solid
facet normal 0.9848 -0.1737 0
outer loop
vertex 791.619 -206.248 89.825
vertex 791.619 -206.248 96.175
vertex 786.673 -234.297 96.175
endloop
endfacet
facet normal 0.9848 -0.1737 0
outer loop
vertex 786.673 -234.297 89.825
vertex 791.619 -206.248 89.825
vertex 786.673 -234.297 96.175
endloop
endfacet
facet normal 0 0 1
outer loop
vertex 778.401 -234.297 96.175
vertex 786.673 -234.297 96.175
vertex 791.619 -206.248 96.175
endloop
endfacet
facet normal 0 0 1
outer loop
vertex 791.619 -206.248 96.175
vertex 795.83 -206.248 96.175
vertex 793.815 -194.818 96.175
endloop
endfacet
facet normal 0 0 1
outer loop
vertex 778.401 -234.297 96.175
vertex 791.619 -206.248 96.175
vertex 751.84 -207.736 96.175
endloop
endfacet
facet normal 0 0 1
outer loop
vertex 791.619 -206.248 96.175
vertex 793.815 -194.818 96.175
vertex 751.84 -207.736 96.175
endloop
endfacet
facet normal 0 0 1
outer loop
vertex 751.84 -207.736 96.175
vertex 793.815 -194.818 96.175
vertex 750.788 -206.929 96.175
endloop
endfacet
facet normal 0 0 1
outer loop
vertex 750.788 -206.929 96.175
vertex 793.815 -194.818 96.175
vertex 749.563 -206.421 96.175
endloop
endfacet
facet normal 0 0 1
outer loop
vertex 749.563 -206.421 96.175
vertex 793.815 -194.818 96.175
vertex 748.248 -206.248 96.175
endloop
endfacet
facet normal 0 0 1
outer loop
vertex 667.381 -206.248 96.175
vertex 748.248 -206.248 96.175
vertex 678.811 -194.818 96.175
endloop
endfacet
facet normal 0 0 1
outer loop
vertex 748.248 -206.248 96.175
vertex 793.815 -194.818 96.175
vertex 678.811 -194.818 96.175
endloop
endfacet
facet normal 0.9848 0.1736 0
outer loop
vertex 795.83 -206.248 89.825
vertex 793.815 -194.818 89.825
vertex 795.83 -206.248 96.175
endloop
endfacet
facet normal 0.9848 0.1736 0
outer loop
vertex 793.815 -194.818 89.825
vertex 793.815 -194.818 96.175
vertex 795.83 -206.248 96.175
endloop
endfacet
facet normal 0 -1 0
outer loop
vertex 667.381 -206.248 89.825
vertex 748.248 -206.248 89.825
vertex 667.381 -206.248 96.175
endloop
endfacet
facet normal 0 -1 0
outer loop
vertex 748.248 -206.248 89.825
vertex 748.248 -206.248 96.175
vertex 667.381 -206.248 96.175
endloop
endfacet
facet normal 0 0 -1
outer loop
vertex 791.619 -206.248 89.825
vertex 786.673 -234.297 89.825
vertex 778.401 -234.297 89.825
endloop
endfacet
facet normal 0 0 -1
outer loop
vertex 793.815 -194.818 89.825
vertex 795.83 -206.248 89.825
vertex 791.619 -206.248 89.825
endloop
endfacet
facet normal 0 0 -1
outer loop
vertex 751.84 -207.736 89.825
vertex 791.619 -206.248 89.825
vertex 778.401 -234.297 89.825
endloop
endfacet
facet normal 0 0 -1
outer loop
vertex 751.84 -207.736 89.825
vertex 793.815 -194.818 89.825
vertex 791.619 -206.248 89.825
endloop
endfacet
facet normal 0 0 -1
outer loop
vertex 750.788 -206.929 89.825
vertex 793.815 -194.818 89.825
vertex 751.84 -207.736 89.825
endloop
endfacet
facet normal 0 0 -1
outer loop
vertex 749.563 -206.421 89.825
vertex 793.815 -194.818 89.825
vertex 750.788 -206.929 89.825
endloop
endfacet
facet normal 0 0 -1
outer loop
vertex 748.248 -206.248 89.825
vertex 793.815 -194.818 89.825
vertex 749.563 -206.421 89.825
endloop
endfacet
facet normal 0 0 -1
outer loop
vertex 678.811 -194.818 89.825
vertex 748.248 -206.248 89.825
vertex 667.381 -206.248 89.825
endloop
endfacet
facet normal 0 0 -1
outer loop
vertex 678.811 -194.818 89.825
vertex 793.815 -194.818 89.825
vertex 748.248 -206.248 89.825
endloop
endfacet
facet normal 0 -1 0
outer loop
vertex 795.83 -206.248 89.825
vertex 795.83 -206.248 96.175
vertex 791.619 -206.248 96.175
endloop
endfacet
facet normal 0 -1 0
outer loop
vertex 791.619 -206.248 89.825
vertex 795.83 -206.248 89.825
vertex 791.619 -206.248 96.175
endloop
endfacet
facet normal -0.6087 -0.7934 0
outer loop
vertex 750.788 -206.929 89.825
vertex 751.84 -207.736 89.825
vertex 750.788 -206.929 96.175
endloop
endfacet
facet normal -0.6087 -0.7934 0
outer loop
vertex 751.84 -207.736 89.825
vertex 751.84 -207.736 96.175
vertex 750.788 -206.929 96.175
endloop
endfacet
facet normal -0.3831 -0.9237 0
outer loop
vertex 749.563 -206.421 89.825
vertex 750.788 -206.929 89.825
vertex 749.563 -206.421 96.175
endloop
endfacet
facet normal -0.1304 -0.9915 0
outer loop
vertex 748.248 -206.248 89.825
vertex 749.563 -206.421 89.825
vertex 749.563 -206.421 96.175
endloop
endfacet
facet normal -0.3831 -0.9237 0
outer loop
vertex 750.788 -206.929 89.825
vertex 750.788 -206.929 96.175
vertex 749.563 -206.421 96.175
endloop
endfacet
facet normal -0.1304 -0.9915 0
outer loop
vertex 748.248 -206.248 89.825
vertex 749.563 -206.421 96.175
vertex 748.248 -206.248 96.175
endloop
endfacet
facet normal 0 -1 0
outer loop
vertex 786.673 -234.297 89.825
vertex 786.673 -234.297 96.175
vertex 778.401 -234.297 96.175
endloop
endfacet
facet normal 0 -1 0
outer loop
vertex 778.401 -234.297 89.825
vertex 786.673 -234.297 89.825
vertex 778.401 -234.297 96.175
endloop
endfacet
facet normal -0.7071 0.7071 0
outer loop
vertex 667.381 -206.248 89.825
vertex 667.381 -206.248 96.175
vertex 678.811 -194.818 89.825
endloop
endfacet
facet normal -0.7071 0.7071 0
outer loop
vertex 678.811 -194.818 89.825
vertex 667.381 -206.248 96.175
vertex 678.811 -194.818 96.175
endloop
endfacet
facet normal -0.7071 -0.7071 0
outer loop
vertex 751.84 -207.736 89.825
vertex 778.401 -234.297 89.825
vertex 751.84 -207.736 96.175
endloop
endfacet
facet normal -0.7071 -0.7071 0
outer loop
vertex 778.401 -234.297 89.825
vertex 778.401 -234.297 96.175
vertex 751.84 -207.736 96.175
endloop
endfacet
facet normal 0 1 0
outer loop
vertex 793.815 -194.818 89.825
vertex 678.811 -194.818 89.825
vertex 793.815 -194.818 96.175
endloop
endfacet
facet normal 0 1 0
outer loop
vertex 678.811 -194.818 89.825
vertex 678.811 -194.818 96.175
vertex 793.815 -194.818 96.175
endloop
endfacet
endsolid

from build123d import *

# Parameters (mm, degrees)
BOSS_EXTRUDE1_DEPTH = 3.175


with BuildPart() as part:
    # Sketch1 → Boss-Extrude1 (new, symmetric)
    with BuildSketch(Plane.XY.offset(93)):
        with BuildLine():
            Line((786.672833799, -234.297326982), (778.40142943, -234.297326982))
            Line((778.40142943, -234.297326982), (751.84, -207.735897552))
            ThreePointArc((751.84, -207.735897552), (750.191929388, -206.634691975), (748.247897552, -206.248))
            Line((748.247897552, -206.248), (667.381261469, -206.248))
            Line((667.381261469, -206.248), (678.811261469, -194.818))
            Line((678.811261469, -194.818), (793.814823755, -194.818))
            Line((793.814823755, -194.818), (795.830241145, -206.248))
            Line((795.830241145, -206.248), (791.618686937, -206.248))
            Line((791.618686937, -206.248), (786.672833799, -234.297326982))
        make_face()
    extrude(amount=BOSS_EXTRUDE1_DEPTH, both=True)


solid = part.part
